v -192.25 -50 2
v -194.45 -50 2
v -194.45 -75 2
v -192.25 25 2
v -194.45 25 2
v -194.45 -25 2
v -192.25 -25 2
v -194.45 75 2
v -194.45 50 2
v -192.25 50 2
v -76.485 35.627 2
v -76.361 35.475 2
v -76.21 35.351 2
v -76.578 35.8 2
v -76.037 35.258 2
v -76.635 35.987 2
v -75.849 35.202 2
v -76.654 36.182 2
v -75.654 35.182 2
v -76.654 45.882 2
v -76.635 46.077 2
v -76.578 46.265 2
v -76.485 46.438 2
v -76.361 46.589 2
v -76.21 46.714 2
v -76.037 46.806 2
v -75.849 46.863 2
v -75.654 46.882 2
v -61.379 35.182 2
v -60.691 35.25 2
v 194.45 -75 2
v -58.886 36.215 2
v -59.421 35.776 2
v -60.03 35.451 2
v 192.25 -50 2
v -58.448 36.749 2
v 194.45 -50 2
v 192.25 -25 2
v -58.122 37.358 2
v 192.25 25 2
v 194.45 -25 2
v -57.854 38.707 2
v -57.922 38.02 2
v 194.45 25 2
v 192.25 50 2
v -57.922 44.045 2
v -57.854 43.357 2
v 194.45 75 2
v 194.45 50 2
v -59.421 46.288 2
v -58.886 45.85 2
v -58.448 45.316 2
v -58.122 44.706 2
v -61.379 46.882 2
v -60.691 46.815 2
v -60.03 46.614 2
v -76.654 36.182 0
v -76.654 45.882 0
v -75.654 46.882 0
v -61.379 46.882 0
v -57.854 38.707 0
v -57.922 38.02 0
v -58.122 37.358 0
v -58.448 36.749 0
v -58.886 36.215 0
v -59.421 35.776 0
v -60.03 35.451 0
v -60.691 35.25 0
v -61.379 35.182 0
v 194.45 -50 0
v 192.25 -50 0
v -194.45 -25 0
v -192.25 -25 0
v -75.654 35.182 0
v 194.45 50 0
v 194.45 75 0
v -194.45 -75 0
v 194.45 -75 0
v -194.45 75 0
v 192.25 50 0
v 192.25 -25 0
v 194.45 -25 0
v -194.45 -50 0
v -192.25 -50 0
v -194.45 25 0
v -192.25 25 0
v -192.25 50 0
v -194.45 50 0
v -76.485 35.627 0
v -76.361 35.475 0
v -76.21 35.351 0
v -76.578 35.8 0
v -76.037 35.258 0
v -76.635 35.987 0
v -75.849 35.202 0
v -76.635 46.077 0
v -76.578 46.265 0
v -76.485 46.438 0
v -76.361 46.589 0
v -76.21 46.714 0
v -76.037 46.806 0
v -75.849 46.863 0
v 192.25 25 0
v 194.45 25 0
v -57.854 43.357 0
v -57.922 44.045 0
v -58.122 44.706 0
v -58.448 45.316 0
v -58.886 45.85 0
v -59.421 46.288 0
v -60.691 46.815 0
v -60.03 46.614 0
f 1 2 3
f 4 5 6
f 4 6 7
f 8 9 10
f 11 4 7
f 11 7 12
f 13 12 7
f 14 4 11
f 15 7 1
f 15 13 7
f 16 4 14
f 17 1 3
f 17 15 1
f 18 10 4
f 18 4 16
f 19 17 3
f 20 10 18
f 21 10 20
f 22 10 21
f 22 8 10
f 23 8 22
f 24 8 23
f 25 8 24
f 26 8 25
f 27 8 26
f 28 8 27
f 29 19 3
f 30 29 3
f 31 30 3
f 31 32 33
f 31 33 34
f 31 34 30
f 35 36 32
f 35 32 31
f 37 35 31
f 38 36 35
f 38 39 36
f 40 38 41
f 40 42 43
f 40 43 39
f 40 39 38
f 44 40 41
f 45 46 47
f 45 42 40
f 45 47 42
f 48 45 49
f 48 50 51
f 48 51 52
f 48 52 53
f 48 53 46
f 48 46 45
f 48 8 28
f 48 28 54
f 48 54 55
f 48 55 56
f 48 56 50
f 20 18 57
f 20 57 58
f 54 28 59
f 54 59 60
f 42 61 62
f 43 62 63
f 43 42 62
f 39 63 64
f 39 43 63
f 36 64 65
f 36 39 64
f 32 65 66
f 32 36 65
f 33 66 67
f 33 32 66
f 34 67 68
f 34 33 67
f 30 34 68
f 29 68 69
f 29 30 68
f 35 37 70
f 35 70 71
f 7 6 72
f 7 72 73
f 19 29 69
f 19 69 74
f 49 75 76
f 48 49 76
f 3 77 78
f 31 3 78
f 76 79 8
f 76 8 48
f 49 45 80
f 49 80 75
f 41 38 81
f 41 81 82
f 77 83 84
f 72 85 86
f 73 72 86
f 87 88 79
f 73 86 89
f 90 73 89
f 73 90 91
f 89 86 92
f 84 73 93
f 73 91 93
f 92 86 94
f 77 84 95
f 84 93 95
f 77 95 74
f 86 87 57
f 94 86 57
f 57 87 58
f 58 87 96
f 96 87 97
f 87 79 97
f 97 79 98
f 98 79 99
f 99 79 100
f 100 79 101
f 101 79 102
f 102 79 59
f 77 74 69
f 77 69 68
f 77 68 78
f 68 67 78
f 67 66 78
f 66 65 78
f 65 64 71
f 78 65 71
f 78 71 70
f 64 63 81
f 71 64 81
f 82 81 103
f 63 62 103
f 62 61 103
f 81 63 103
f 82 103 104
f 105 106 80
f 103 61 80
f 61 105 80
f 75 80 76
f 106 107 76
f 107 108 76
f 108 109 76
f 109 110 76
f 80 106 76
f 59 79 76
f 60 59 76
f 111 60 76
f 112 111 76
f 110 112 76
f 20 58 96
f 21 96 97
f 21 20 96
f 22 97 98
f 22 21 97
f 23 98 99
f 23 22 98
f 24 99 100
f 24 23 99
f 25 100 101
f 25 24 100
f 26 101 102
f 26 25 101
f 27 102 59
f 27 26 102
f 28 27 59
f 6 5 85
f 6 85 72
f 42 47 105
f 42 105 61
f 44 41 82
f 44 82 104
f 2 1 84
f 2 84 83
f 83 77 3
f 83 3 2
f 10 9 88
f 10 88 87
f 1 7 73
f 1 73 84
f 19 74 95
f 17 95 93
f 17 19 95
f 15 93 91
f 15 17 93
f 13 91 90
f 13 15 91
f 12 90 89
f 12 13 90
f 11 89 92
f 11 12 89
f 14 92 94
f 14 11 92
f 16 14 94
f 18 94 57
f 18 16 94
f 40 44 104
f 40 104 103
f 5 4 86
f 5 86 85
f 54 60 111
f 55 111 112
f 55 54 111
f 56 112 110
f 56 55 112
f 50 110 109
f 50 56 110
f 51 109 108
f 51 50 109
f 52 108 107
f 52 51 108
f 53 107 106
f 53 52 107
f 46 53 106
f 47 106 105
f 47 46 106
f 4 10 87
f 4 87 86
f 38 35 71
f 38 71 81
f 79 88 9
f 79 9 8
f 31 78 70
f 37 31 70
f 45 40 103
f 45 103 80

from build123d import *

# Parameters (mm, degrees)
SKETCH1_W           = 388.9
SKETCH1_H           = 150
BOSS_EXTRUDE1_DEPTH = 2
CUT_EXTRUDE1_DEPTH  = 2
CUT_EXTRUDE2_DEPTH  = 10


with BuildPart() as part:
    # Sketch1 → Boss-Extrude1 (new body)
    with BuildSketch(Plane.XY):
        Rectangle(SKETCH1_W, SKETCH1_H)
    extrude(amount=BOSS_EXTRUDE1_DEPTH)

    # Sketch2 → Cut-Extrude1 (cut)
    with BuildSketch(Plane.XY.offset(2)):
        Polygon((-194.45, 75), (-194.45, 50), (-192.25, 50), (-192.25, 25), (-194.45, 25), (-194.45, -25), (-192.25, -25), (-192.25, -50), (-194.45, -50), (-194.45, -75), (-200.131659393, -75), (-200.131659393, 75), align=None)
        Polygon((194.45, -75), (194.45, -50), (192.25, -50), (192.25, -25), (194.45, -25), (194.45, 25), (192.25, 25), (192.25, 50), (194.45, 50), (194.45, 75), (200.131659393, 75), (200.131659393, -75), align=None)
    extrude(amount=-CUT_EXTRUDE1_DEPTH, mode=Mode.SUBTRACT)

    # Sketch3 → Cut-Extrude2 (cut)
    with BuildSketch(Plane.XY.offset(2)):
        with BuildLine():
            Line((-61.37897888, 35.182338168), (-75.65397888, 35.182338168))
            ThreePointArc((-75.65397888, 35.182338168), (-76.361085661, 35.475231386), (-76.65397888, 36.182338168))
            Line((-76.65397888, 36.182338168), (-76.65397888, 45.882338168))
            ThreePointArc((-76.65397888, 45.882338168), (-76.361085661, 46.589444949), (-75.65397888, 46.882338168))
            Line((-75.65397888, 46.882338168), (-61.37897888, 46.882338168))
            ThreePointArc((-61.37897888, 46.882338168), (-58.886427476, 45.849889571), (-57.85397888, 43.357338168))
            Line((-57.85397888, 43.357338168), (-57.85397888, 38.707338168))
            ThreePointArc((-57.85397888, 38.707338168), (-58.886427476, 36.214786764), (-61.37897888, 35.182338168))
        make_face()
    extrude(amount=-CUT_EXTRUDE2_DEPTH, mode=Mode.SUBTRACT)


solid = part.part
